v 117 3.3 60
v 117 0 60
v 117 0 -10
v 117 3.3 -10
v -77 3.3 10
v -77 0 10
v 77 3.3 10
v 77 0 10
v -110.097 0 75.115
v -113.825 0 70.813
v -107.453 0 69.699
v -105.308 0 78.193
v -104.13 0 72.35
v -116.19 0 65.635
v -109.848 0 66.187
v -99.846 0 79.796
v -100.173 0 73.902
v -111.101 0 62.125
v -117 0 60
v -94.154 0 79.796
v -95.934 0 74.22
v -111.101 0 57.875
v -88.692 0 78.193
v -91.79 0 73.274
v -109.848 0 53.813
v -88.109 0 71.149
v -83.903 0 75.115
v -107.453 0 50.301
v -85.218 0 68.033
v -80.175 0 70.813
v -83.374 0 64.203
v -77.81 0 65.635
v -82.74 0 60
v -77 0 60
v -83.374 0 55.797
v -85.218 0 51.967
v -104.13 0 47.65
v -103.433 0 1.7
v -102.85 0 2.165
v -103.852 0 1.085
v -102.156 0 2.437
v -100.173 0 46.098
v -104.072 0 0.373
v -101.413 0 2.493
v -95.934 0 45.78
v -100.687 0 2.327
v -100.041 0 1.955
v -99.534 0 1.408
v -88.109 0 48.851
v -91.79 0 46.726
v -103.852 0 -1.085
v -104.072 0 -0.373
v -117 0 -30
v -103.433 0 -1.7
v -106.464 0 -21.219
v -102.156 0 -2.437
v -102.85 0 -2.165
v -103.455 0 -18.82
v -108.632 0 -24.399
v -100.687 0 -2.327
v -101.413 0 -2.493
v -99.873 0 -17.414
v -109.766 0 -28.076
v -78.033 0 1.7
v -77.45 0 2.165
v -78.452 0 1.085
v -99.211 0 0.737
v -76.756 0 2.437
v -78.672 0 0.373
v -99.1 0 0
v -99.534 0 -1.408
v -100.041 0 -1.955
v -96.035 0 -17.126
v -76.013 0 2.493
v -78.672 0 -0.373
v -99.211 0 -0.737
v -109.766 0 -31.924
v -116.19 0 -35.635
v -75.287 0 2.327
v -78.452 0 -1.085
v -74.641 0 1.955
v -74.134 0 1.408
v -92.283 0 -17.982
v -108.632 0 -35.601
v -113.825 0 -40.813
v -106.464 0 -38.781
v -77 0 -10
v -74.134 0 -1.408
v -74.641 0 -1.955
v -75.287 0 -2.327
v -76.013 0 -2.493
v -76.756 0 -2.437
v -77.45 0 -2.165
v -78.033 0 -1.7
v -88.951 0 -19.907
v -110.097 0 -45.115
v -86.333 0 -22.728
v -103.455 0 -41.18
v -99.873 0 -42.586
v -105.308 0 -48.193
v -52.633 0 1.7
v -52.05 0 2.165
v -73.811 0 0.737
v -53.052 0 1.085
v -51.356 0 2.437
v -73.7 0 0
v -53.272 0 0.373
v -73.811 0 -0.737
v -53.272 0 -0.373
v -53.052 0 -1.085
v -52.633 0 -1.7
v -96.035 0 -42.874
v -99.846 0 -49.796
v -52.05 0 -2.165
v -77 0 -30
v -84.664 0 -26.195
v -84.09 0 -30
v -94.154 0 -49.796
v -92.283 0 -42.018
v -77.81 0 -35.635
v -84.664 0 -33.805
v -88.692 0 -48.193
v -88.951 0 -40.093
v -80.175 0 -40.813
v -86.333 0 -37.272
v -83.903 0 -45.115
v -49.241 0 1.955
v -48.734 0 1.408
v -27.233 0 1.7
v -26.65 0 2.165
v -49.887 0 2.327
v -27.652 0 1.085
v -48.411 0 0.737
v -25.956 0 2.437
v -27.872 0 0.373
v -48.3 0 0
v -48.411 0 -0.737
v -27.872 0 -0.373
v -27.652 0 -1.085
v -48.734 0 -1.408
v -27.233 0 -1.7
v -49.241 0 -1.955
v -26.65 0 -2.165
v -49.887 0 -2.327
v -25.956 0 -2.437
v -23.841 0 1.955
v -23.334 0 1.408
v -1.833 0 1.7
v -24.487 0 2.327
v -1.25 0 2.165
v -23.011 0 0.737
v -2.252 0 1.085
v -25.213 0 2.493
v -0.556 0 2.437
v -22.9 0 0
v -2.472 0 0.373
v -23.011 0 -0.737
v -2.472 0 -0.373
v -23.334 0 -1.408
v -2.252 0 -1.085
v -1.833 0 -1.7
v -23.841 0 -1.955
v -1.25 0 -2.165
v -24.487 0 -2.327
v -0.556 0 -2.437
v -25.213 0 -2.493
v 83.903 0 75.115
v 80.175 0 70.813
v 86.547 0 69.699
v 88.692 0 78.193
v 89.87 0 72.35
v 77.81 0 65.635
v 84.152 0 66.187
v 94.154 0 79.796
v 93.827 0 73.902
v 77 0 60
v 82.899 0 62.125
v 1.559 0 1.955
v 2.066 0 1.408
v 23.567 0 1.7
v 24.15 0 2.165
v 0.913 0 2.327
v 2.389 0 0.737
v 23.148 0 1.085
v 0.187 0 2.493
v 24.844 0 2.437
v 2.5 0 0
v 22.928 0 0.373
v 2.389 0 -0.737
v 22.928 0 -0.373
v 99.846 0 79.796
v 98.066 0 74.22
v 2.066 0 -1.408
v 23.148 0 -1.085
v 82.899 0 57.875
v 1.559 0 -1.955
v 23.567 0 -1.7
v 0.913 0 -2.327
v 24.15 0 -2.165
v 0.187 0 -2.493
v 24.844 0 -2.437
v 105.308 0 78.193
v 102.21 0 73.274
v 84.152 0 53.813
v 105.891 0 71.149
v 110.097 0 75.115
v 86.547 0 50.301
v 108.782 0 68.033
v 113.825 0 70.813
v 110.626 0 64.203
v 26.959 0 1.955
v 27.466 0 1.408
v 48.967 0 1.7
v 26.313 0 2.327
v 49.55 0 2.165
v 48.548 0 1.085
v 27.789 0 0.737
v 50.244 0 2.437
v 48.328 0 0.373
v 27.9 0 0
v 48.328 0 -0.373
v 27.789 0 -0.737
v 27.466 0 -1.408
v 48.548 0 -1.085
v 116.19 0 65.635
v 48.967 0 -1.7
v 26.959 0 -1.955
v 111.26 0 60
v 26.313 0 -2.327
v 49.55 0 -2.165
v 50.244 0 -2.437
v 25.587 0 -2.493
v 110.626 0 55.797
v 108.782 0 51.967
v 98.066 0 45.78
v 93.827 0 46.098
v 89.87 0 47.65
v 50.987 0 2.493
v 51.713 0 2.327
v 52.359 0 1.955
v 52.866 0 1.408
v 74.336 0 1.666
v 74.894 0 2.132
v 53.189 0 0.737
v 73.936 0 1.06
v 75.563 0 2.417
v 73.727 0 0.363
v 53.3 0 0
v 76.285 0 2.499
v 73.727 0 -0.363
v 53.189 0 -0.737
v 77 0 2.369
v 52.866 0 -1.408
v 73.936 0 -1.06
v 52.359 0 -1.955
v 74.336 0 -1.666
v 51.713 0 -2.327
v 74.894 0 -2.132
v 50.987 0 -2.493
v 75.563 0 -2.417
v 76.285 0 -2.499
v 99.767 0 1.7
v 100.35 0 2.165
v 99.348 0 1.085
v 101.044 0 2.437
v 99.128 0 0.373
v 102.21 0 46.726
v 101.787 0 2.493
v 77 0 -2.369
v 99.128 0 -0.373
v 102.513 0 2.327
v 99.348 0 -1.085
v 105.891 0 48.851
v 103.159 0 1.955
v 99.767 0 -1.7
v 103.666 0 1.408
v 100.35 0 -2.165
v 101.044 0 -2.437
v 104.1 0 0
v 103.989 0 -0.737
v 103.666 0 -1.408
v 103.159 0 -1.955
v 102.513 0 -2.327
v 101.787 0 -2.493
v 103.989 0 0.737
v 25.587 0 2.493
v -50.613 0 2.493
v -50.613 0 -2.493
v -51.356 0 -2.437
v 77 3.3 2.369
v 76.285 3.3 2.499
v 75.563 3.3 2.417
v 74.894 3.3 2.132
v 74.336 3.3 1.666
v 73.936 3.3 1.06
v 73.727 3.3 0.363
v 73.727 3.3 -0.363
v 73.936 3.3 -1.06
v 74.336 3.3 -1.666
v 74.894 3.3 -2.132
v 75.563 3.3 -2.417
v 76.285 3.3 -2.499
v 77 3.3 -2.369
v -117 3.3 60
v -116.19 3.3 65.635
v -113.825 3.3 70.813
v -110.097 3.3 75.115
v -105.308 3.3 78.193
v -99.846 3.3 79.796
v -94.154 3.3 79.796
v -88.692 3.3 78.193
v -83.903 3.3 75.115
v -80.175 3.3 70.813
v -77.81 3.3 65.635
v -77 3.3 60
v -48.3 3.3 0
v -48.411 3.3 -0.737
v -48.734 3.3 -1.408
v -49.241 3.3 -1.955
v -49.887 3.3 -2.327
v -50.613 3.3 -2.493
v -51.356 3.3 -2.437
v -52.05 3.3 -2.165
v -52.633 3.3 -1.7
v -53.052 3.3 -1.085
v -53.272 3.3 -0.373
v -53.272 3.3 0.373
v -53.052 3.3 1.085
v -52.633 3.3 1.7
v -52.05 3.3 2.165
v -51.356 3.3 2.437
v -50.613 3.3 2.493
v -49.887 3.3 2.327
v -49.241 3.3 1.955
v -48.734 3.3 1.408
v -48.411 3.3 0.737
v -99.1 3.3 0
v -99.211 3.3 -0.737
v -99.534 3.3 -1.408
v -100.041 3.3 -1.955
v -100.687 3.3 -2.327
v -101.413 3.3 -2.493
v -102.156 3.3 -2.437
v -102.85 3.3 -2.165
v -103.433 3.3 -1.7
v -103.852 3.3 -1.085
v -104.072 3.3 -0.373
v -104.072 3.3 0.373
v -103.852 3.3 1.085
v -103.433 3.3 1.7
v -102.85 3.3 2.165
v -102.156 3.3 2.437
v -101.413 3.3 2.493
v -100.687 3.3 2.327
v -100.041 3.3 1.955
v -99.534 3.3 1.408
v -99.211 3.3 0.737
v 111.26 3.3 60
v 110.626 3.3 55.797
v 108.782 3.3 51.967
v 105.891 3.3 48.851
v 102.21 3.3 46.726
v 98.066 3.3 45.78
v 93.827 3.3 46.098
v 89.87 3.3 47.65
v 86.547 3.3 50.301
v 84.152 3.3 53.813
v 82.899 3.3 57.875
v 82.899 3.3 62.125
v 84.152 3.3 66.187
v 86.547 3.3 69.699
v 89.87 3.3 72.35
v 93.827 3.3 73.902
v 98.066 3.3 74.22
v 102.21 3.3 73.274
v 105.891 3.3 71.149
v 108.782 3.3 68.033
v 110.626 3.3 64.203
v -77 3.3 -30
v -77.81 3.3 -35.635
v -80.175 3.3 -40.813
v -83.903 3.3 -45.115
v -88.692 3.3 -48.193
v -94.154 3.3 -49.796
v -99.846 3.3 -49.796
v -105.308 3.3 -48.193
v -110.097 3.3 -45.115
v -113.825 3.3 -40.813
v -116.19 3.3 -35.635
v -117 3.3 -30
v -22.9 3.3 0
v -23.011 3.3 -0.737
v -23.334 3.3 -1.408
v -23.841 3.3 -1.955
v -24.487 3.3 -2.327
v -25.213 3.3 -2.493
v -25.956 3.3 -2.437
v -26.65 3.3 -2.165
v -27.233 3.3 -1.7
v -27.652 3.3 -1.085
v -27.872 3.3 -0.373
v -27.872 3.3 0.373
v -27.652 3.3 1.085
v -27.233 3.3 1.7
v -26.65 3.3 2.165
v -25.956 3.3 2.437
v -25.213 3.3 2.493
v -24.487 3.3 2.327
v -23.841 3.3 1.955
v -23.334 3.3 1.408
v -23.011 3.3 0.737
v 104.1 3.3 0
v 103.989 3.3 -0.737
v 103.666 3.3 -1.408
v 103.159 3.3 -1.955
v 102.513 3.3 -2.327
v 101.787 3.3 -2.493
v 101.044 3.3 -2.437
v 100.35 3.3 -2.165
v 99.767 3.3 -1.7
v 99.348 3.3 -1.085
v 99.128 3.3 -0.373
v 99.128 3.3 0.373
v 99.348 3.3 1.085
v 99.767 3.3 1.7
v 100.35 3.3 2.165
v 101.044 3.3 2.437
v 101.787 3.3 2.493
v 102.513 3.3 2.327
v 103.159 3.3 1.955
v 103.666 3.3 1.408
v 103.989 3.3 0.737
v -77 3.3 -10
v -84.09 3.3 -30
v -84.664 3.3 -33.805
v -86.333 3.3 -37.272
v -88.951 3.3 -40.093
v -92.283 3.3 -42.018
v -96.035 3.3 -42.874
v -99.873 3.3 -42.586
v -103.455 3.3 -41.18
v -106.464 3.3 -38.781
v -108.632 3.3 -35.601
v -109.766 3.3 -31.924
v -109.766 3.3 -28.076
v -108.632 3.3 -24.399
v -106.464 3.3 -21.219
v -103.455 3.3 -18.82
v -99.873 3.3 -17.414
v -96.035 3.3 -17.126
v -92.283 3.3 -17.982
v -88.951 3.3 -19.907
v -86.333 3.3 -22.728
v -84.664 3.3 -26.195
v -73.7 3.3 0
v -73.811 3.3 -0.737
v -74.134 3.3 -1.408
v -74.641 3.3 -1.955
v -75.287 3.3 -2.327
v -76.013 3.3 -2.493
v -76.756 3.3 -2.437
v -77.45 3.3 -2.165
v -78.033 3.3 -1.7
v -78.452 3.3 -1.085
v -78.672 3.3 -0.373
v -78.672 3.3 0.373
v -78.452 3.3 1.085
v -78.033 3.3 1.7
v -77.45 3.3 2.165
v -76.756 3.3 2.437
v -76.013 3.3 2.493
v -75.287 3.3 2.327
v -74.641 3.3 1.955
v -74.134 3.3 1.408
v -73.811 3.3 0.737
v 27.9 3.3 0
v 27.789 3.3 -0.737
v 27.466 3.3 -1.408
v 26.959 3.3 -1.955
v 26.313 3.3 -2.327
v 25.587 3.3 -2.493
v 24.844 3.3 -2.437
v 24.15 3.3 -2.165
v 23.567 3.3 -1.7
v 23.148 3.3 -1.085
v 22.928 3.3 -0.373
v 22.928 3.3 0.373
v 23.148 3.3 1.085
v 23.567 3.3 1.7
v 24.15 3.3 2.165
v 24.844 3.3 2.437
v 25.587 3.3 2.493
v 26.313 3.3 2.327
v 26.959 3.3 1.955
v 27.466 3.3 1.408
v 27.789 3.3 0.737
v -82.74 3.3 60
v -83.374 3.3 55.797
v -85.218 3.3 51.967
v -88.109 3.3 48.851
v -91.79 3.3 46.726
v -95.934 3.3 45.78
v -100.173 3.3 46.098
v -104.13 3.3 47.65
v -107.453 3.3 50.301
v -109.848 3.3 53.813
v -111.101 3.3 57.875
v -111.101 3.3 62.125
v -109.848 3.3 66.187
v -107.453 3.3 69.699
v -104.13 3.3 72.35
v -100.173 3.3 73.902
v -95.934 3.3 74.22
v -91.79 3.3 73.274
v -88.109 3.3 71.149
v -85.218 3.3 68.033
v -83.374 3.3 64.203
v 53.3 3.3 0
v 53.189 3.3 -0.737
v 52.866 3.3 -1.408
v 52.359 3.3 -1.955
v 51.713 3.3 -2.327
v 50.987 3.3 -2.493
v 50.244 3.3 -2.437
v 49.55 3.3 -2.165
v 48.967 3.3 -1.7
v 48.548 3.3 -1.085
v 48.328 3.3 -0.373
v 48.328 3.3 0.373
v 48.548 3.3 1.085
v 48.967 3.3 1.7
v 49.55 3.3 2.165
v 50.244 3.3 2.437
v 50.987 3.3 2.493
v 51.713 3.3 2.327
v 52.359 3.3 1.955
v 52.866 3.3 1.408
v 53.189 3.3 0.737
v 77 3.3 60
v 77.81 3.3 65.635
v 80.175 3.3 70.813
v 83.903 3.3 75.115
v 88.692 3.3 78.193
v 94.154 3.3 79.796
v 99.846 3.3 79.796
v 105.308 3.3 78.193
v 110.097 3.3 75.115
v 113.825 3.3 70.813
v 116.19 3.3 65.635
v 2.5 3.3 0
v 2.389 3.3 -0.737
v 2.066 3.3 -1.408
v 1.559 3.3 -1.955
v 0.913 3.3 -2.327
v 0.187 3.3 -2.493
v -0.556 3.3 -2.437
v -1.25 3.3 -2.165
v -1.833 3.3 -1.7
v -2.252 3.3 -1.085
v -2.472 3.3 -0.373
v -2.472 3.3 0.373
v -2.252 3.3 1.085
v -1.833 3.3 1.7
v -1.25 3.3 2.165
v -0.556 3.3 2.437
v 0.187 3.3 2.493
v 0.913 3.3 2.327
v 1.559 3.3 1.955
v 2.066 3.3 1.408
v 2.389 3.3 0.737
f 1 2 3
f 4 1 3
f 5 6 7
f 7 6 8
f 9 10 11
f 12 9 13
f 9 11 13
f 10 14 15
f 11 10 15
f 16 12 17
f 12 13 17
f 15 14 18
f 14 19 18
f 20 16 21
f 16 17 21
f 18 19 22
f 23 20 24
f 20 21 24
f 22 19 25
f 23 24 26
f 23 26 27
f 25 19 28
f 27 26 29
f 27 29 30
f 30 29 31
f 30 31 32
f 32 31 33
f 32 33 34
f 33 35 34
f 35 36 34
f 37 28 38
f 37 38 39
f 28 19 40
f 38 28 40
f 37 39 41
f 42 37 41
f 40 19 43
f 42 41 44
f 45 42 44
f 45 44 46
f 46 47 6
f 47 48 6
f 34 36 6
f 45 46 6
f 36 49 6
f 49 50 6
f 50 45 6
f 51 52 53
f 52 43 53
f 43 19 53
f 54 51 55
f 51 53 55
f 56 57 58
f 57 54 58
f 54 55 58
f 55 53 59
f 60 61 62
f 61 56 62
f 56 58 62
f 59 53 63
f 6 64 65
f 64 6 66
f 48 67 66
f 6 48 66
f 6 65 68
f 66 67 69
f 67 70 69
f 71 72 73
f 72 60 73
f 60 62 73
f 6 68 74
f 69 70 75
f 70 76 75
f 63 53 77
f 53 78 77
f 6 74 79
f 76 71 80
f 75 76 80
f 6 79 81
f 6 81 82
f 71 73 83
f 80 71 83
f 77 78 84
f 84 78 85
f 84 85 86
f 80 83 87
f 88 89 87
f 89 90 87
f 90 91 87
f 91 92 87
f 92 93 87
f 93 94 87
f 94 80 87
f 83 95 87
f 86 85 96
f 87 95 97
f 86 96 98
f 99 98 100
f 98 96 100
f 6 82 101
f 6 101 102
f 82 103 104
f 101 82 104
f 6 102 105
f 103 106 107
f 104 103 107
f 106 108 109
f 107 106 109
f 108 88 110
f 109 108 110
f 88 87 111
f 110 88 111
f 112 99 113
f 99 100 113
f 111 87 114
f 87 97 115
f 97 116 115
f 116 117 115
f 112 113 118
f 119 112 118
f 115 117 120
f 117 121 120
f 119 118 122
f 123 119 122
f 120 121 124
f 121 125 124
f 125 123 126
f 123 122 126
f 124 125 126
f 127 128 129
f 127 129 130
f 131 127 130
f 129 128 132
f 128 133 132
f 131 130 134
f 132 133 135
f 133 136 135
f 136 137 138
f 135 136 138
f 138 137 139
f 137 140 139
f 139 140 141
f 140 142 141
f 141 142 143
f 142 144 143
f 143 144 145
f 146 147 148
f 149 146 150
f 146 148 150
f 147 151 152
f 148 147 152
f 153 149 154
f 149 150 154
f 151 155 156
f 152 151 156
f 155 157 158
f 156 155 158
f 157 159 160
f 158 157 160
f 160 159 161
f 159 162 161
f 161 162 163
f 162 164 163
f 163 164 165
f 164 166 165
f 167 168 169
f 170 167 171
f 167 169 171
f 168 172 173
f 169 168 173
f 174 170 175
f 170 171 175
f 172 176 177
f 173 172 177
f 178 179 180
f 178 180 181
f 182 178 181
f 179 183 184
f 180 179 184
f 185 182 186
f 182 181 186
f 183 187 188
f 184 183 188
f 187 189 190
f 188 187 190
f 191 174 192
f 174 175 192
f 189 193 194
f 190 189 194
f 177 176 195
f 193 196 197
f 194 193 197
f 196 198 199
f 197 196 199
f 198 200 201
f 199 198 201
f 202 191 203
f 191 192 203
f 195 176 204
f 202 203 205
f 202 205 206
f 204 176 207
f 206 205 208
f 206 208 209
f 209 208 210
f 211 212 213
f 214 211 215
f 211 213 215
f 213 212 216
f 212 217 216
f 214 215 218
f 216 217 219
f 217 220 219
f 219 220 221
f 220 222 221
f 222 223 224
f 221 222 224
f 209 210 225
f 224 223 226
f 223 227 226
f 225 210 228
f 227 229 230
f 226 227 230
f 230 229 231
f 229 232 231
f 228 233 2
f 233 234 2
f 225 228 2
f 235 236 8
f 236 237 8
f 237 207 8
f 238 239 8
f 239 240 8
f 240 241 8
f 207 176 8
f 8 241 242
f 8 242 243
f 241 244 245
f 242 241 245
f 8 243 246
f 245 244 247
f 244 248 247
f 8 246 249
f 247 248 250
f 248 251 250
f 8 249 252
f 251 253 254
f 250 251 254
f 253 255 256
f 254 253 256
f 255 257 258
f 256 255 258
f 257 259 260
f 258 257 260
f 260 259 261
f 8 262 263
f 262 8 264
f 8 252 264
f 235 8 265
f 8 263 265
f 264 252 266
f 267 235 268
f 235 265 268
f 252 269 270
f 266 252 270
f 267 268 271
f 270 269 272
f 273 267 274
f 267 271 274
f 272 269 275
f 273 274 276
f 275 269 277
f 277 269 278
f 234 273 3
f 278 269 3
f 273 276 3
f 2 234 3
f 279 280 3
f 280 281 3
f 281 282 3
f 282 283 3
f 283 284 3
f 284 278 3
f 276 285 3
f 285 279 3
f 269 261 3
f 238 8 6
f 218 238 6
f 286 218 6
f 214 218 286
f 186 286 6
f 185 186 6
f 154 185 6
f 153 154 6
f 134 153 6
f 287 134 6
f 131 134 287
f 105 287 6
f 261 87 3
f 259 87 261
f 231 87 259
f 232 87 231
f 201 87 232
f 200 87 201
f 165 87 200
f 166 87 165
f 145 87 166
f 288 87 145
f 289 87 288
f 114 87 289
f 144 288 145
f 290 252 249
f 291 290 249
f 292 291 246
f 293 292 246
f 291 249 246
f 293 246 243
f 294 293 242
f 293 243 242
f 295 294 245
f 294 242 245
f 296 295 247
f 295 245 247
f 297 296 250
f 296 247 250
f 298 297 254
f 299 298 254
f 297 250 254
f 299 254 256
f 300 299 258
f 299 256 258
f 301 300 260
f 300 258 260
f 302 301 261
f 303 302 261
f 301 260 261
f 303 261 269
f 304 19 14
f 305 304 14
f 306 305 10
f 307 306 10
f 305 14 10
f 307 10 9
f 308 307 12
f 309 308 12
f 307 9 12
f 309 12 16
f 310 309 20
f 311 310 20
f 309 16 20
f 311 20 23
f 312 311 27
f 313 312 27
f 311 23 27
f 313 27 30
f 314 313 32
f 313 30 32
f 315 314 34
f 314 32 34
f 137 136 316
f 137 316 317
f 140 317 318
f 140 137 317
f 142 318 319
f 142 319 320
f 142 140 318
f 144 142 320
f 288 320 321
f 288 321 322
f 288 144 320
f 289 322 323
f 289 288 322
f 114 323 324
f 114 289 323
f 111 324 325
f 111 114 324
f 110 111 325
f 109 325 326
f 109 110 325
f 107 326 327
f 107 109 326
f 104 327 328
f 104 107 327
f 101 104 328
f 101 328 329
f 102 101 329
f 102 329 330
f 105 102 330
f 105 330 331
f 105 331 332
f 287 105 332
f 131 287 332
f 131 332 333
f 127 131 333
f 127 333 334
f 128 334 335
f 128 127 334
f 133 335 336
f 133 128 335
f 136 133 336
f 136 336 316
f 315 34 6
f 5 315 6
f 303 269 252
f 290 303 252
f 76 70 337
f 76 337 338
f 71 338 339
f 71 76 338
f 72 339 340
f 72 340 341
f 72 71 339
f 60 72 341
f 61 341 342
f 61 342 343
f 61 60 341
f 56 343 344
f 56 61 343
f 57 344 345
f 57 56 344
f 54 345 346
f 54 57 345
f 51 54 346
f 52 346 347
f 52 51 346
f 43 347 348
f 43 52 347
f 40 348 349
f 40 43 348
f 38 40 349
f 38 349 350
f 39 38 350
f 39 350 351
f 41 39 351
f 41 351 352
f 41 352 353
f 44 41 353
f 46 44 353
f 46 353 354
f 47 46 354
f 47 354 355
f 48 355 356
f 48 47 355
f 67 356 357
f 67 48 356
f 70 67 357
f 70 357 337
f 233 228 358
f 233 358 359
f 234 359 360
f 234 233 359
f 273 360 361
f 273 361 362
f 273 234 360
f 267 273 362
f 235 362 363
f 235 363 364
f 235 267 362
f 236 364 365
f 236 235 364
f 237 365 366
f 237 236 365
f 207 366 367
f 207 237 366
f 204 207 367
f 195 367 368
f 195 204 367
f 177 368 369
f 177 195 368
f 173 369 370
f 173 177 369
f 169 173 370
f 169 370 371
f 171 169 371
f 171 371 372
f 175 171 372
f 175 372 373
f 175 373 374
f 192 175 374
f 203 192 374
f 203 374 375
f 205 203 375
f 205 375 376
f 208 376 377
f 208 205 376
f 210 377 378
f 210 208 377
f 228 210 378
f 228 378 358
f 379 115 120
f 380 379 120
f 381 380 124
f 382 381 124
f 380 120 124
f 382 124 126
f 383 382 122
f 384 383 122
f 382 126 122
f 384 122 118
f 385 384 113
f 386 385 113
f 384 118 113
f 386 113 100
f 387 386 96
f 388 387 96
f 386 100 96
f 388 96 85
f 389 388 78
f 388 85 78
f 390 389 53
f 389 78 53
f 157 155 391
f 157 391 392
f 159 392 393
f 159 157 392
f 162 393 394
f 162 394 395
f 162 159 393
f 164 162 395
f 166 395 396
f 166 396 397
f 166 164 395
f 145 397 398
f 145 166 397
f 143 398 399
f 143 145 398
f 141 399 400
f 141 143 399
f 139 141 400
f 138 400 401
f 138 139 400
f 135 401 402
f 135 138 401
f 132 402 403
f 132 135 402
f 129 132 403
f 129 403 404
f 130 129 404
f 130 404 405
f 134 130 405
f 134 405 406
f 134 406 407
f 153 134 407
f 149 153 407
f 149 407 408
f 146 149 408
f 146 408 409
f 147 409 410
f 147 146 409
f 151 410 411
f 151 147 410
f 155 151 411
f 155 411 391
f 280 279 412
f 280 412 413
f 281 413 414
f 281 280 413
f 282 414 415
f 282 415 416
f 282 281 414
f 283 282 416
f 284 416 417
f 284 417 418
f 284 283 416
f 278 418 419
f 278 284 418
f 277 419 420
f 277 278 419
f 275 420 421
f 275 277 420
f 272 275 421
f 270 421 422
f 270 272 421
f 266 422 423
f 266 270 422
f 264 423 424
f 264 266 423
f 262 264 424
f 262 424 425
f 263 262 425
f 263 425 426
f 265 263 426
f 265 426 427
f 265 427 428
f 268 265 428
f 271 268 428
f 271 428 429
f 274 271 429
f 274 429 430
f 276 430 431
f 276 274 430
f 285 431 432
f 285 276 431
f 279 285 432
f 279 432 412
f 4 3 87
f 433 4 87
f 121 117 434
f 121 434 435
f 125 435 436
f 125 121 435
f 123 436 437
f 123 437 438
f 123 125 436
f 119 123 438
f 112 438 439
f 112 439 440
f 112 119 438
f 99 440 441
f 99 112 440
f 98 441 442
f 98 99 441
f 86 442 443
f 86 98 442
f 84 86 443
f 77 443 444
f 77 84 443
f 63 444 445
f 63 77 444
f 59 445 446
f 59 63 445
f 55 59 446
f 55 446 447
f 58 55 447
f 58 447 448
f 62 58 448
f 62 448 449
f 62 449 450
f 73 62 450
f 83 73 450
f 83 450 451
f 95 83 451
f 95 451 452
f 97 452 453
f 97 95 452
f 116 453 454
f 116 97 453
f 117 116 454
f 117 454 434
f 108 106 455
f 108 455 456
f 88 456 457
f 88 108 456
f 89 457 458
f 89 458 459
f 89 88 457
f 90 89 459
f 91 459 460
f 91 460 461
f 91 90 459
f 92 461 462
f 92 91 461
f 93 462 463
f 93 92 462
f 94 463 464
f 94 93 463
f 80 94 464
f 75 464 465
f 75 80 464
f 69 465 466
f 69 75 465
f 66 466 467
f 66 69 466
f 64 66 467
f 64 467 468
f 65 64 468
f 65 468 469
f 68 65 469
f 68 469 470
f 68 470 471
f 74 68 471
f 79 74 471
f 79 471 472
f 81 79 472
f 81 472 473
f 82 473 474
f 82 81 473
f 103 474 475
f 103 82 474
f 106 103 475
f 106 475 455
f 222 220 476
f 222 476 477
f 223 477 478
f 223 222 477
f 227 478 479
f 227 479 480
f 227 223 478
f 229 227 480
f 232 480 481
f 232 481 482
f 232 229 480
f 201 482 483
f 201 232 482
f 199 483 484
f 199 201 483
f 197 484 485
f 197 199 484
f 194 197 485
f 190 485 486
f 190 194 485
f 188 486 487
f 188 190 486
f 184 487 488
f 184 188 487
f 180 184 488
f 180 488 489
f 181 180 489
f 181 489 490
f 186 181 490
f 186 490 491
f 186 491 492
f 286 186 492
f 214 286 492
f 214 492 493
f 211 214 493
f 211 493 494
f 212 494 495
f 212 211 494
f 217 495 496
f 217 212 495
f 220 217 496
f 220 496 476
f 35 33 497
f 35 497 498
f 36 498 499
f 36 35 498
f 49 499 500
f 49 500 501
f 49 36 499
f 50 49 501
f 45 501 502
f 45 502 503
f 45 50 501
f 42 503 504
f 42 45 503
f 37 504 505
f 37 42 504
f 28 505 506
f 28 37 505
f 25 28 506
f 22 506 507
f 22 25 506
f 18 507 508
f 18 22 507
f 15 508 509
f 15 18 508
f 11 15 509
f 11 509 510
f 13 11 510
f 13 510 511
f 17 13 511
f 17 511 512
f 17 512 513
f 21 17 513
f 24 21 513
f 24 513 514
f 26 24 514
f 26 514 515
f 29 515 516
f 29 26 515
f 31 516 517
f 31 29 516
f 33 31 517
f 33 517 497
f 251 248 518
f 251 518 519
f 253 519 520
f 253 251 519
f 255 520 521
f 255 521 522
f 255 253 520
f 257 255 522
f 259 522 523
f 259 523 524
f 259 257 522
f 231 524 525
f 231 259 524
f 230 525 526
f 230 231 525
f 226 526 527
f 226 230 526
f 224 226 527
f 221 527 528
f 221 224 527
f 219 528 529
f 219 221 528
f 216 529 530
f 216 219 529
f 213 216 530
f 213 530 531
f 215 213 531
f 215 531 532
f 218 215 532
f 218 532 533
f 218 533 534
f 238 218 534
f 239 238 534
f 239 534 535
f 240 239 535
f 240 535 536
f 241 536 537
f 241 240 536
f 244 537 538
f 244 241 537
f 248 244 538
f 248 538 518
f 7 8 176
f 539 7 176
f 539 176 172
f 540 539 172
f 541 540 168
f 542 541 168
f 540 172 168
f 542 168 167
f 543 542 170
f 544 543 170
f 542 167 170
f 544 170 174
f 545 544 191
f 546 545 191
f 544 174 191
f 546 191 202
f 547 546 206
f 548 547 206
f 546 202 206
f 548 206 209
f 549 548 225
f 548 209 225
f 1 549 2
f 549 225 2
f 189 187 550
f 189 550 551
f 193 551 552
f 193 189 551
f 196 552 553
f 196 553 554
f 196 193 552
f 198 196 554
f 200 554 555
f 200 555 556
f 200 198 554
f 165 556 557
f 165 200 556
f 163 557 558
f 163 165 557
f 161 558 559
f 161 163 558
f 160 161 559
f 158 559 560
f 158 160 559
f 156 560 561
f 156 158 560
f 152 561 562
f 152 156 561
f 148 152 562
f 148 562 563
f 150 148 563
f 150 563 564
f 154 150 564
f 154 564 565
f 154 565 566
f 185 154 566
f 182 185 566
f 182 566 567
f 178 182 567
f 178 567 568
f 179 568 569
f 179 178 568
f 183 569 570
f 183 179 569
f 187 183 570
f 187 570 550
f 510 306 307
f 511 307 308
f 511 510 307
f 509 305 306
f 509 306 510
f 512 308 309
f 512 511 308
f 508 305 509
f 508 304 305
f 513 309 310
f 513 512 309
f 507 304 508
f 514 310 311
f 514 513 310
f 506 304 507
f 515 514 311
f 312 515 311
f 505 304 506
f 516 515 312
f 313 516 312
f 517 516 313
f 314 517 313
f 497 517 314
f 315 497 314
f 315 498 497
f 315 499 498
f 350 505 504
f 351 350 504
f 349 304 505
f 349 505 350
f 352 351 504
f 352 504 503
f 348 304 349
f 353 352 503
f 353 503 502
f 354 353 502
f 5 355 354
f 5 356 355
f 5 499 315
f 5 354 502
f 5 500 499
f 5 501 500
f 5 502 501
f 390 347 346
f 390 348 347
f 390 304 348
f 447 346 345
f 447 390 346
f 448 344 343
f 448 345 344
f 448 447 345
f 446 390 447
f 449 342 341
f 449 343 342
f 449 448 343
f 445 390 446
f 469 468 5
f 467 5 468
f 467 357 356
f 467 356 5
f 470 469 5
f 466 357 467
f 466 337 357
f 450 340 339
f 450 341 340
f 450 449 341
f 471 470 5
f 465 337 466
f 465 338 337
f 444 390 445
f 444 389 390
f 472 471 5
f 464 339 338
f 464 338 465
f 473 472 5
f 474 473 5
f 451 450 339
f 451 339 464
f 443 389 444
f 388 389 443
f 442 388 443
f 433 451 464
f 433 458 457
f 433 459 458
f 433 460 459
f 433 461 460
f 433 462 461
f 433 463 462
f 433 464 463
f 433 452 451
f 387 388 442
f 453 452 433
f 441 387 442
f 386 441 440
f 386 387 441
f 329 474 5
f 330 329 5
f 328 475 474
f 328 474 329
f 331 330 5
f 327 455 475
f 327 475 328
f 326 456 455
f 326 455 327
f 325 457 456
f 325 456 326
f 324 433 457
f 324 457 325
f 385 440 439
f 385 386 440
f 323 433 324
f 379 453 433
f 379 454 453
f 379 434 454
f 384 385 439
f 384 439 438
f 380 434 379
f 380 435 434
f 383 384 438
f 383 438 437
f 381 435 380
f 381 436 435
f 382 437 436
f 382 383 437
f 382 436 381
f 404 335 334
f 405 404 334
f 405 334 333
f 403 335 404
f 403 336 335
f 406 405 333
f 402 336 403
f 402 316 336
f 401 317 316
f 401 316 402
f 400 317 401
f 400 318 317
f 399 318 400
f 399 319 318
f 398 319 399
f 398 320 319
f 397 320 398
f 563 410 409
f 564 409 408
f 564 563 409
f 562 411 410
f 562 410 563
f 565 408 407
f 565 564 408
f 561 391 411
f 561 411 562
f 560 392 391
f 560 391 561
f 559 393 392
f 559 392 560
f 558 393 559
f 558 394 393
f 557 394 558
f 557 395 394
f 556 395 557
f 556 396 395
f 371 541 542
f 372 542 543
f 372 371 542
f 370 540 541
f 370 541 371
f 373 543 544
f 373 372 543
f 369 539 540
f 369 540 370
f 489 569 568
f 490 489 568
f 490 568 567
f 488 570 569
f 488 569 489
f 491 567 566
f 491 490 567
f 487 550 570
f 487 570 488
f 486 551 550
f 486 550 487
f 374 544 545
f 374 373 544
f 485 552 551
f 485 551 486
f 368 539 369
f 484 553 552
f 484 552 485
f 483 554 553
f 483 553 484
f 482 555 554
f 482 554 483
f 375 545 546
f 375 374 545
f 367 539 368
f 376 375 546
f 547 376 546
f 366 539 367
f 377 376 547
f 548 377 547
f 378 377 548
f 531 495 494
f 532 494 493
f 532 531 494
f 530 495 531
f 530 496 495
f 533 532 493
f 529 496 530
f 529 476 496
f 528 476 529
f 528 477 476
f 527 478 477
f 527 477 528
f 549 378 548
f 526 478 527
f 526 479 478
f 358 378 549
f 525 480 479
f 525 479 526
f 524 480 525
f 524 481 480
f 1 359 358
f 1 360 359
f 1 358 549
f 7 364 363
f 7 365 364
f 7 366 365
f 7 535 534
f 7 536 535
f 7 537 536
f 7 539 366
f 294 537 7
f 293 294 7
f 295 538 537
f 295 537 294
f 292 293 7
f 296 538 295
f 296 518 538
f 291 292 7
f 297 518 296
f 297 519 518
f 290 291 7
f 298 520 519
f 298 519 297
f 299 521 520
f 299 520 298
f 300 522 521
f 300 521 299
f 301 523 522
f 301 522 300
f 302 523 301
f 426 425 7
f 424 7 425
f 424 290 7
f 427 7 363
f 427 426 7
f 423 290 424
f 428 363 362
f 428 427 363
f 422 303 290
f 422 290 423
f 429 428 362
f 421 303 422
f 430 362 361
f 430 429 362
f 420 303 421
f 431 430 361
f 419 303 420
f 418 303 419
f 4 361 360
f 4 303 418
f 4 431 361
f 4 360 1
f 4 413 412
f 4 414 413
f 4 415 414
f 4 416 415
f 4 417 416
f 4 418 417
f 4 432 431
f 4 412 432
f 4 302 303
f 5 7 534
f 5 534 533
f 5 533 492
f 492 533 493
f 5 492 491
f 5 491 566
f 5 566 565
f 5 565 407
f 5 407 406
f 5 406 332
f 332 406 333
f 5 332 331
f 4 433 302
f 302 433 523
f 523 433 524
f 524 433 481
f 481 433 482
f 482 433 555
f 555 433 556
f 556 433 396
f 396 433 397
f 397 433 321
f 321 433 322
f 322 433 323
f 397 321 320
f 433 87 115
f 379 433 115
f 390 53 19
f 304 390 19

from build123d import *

# Parameters (mm, degrees)
SKETCH1_R               = 2.5
SKETCH1_R_2             = 14.26
BOSS_EXTRUDE1_DEPTH     = 3.3
SKETCH1_3_R             = 12.91
SALIENTE_EXTRUIR1_DEPTH = 3.3


with BuildPart() as part:
    # Sketch1 → Boss-Extrude1 (new body)
    with BuildSketch(Plane(origin=(0, 0, 0), x_dir=(1, 0, 0), z_dir=(0, 1, 0))):
        with BuildLine():
            Line((-117, 10), (-117, -60))
            ThreePointArc((-117, -60), (-97, -80), (-77, -60))
            Line((-77, -60), (-77, -10))
            Line((-77, -10), (77, -10))
            Line((77, -10), (77, -60))
            ThreePointArc((77, -60), (97, -80), (117, -60))
            Line((117, -60), (117, 10))
            Line((117, 10), (-117, 10))
        make_face()
        with BuildLine():
            ThreePointArc((77, -2.368543856), (73.7, 0), (77, 2.368543856))
            Line((77, 2.368543856), (77, -2.368543856))
        make_face(mode=Mode.SUBTRACT)
        with Locations((-101.6, 0)):
            Circle(SKETCH1_R, mode=Mode.SUBTRACT)
        with Locations((-76.2, 0)):
            Circle(SKETCH1_R, mode=Mode.SUBTRACT)
        with Locations((-50.8, 0)):
            Circle(SKETCH1_R, mode=Mode.SUBTRACT)
        with Locations((-25.4, 0)):
            Circle(SKETCH1_R, mode=Mode.SUBTRACT)
        Circle(SKETCH1_R, mode=Mode.SUBTRACT)
        with Locations((25.4, 0)):
            Circle(SKETCH1_R, mode=Mode.SUBTRACT)
        with Locations((50.8, 0)):
            Circle(SKETCH1_R, mode=Mode.SUBTRACT)
        with Locations((-97, -60)):
            Circle(SKETCH1_R_2, mode=Mode.SUBTRACT)
        with Locations((101.6, 0)):
            Circle(SKETCH1_R, mode=Mode.SUBTRACT)
        with Locations((97, -60)):
            Circle(SKETCH1_R_2, mode=Mode.SUBTRACT)
    extrude(amount=BOSS_EXTRUDE1_DEPTH)

    # Sketch1<3> → Saliente-Extruir1 (add)
    with BuildSketch(Plane(origin=(0, 0, 0), x_dir=(1, 0, 0), z_dir=(0, 1, 0))):
        with BuildLine():
            Line((-117, 30), (-117, 10))
            Line((-117, 10), (-77, 10))
            Line((-77, 10), (-77, 30))
            ThreePointArc((-77, 30), (-97, 50), (-117, 30))
        make_face()
        with Locations((-97, 30)):
            Circle(SKETCH1_3_R, mode=Mode.SUBTRACT)
    extrude(amount=SALIENTE_EXTRUIR1_DEPTH)


solid = part.part
